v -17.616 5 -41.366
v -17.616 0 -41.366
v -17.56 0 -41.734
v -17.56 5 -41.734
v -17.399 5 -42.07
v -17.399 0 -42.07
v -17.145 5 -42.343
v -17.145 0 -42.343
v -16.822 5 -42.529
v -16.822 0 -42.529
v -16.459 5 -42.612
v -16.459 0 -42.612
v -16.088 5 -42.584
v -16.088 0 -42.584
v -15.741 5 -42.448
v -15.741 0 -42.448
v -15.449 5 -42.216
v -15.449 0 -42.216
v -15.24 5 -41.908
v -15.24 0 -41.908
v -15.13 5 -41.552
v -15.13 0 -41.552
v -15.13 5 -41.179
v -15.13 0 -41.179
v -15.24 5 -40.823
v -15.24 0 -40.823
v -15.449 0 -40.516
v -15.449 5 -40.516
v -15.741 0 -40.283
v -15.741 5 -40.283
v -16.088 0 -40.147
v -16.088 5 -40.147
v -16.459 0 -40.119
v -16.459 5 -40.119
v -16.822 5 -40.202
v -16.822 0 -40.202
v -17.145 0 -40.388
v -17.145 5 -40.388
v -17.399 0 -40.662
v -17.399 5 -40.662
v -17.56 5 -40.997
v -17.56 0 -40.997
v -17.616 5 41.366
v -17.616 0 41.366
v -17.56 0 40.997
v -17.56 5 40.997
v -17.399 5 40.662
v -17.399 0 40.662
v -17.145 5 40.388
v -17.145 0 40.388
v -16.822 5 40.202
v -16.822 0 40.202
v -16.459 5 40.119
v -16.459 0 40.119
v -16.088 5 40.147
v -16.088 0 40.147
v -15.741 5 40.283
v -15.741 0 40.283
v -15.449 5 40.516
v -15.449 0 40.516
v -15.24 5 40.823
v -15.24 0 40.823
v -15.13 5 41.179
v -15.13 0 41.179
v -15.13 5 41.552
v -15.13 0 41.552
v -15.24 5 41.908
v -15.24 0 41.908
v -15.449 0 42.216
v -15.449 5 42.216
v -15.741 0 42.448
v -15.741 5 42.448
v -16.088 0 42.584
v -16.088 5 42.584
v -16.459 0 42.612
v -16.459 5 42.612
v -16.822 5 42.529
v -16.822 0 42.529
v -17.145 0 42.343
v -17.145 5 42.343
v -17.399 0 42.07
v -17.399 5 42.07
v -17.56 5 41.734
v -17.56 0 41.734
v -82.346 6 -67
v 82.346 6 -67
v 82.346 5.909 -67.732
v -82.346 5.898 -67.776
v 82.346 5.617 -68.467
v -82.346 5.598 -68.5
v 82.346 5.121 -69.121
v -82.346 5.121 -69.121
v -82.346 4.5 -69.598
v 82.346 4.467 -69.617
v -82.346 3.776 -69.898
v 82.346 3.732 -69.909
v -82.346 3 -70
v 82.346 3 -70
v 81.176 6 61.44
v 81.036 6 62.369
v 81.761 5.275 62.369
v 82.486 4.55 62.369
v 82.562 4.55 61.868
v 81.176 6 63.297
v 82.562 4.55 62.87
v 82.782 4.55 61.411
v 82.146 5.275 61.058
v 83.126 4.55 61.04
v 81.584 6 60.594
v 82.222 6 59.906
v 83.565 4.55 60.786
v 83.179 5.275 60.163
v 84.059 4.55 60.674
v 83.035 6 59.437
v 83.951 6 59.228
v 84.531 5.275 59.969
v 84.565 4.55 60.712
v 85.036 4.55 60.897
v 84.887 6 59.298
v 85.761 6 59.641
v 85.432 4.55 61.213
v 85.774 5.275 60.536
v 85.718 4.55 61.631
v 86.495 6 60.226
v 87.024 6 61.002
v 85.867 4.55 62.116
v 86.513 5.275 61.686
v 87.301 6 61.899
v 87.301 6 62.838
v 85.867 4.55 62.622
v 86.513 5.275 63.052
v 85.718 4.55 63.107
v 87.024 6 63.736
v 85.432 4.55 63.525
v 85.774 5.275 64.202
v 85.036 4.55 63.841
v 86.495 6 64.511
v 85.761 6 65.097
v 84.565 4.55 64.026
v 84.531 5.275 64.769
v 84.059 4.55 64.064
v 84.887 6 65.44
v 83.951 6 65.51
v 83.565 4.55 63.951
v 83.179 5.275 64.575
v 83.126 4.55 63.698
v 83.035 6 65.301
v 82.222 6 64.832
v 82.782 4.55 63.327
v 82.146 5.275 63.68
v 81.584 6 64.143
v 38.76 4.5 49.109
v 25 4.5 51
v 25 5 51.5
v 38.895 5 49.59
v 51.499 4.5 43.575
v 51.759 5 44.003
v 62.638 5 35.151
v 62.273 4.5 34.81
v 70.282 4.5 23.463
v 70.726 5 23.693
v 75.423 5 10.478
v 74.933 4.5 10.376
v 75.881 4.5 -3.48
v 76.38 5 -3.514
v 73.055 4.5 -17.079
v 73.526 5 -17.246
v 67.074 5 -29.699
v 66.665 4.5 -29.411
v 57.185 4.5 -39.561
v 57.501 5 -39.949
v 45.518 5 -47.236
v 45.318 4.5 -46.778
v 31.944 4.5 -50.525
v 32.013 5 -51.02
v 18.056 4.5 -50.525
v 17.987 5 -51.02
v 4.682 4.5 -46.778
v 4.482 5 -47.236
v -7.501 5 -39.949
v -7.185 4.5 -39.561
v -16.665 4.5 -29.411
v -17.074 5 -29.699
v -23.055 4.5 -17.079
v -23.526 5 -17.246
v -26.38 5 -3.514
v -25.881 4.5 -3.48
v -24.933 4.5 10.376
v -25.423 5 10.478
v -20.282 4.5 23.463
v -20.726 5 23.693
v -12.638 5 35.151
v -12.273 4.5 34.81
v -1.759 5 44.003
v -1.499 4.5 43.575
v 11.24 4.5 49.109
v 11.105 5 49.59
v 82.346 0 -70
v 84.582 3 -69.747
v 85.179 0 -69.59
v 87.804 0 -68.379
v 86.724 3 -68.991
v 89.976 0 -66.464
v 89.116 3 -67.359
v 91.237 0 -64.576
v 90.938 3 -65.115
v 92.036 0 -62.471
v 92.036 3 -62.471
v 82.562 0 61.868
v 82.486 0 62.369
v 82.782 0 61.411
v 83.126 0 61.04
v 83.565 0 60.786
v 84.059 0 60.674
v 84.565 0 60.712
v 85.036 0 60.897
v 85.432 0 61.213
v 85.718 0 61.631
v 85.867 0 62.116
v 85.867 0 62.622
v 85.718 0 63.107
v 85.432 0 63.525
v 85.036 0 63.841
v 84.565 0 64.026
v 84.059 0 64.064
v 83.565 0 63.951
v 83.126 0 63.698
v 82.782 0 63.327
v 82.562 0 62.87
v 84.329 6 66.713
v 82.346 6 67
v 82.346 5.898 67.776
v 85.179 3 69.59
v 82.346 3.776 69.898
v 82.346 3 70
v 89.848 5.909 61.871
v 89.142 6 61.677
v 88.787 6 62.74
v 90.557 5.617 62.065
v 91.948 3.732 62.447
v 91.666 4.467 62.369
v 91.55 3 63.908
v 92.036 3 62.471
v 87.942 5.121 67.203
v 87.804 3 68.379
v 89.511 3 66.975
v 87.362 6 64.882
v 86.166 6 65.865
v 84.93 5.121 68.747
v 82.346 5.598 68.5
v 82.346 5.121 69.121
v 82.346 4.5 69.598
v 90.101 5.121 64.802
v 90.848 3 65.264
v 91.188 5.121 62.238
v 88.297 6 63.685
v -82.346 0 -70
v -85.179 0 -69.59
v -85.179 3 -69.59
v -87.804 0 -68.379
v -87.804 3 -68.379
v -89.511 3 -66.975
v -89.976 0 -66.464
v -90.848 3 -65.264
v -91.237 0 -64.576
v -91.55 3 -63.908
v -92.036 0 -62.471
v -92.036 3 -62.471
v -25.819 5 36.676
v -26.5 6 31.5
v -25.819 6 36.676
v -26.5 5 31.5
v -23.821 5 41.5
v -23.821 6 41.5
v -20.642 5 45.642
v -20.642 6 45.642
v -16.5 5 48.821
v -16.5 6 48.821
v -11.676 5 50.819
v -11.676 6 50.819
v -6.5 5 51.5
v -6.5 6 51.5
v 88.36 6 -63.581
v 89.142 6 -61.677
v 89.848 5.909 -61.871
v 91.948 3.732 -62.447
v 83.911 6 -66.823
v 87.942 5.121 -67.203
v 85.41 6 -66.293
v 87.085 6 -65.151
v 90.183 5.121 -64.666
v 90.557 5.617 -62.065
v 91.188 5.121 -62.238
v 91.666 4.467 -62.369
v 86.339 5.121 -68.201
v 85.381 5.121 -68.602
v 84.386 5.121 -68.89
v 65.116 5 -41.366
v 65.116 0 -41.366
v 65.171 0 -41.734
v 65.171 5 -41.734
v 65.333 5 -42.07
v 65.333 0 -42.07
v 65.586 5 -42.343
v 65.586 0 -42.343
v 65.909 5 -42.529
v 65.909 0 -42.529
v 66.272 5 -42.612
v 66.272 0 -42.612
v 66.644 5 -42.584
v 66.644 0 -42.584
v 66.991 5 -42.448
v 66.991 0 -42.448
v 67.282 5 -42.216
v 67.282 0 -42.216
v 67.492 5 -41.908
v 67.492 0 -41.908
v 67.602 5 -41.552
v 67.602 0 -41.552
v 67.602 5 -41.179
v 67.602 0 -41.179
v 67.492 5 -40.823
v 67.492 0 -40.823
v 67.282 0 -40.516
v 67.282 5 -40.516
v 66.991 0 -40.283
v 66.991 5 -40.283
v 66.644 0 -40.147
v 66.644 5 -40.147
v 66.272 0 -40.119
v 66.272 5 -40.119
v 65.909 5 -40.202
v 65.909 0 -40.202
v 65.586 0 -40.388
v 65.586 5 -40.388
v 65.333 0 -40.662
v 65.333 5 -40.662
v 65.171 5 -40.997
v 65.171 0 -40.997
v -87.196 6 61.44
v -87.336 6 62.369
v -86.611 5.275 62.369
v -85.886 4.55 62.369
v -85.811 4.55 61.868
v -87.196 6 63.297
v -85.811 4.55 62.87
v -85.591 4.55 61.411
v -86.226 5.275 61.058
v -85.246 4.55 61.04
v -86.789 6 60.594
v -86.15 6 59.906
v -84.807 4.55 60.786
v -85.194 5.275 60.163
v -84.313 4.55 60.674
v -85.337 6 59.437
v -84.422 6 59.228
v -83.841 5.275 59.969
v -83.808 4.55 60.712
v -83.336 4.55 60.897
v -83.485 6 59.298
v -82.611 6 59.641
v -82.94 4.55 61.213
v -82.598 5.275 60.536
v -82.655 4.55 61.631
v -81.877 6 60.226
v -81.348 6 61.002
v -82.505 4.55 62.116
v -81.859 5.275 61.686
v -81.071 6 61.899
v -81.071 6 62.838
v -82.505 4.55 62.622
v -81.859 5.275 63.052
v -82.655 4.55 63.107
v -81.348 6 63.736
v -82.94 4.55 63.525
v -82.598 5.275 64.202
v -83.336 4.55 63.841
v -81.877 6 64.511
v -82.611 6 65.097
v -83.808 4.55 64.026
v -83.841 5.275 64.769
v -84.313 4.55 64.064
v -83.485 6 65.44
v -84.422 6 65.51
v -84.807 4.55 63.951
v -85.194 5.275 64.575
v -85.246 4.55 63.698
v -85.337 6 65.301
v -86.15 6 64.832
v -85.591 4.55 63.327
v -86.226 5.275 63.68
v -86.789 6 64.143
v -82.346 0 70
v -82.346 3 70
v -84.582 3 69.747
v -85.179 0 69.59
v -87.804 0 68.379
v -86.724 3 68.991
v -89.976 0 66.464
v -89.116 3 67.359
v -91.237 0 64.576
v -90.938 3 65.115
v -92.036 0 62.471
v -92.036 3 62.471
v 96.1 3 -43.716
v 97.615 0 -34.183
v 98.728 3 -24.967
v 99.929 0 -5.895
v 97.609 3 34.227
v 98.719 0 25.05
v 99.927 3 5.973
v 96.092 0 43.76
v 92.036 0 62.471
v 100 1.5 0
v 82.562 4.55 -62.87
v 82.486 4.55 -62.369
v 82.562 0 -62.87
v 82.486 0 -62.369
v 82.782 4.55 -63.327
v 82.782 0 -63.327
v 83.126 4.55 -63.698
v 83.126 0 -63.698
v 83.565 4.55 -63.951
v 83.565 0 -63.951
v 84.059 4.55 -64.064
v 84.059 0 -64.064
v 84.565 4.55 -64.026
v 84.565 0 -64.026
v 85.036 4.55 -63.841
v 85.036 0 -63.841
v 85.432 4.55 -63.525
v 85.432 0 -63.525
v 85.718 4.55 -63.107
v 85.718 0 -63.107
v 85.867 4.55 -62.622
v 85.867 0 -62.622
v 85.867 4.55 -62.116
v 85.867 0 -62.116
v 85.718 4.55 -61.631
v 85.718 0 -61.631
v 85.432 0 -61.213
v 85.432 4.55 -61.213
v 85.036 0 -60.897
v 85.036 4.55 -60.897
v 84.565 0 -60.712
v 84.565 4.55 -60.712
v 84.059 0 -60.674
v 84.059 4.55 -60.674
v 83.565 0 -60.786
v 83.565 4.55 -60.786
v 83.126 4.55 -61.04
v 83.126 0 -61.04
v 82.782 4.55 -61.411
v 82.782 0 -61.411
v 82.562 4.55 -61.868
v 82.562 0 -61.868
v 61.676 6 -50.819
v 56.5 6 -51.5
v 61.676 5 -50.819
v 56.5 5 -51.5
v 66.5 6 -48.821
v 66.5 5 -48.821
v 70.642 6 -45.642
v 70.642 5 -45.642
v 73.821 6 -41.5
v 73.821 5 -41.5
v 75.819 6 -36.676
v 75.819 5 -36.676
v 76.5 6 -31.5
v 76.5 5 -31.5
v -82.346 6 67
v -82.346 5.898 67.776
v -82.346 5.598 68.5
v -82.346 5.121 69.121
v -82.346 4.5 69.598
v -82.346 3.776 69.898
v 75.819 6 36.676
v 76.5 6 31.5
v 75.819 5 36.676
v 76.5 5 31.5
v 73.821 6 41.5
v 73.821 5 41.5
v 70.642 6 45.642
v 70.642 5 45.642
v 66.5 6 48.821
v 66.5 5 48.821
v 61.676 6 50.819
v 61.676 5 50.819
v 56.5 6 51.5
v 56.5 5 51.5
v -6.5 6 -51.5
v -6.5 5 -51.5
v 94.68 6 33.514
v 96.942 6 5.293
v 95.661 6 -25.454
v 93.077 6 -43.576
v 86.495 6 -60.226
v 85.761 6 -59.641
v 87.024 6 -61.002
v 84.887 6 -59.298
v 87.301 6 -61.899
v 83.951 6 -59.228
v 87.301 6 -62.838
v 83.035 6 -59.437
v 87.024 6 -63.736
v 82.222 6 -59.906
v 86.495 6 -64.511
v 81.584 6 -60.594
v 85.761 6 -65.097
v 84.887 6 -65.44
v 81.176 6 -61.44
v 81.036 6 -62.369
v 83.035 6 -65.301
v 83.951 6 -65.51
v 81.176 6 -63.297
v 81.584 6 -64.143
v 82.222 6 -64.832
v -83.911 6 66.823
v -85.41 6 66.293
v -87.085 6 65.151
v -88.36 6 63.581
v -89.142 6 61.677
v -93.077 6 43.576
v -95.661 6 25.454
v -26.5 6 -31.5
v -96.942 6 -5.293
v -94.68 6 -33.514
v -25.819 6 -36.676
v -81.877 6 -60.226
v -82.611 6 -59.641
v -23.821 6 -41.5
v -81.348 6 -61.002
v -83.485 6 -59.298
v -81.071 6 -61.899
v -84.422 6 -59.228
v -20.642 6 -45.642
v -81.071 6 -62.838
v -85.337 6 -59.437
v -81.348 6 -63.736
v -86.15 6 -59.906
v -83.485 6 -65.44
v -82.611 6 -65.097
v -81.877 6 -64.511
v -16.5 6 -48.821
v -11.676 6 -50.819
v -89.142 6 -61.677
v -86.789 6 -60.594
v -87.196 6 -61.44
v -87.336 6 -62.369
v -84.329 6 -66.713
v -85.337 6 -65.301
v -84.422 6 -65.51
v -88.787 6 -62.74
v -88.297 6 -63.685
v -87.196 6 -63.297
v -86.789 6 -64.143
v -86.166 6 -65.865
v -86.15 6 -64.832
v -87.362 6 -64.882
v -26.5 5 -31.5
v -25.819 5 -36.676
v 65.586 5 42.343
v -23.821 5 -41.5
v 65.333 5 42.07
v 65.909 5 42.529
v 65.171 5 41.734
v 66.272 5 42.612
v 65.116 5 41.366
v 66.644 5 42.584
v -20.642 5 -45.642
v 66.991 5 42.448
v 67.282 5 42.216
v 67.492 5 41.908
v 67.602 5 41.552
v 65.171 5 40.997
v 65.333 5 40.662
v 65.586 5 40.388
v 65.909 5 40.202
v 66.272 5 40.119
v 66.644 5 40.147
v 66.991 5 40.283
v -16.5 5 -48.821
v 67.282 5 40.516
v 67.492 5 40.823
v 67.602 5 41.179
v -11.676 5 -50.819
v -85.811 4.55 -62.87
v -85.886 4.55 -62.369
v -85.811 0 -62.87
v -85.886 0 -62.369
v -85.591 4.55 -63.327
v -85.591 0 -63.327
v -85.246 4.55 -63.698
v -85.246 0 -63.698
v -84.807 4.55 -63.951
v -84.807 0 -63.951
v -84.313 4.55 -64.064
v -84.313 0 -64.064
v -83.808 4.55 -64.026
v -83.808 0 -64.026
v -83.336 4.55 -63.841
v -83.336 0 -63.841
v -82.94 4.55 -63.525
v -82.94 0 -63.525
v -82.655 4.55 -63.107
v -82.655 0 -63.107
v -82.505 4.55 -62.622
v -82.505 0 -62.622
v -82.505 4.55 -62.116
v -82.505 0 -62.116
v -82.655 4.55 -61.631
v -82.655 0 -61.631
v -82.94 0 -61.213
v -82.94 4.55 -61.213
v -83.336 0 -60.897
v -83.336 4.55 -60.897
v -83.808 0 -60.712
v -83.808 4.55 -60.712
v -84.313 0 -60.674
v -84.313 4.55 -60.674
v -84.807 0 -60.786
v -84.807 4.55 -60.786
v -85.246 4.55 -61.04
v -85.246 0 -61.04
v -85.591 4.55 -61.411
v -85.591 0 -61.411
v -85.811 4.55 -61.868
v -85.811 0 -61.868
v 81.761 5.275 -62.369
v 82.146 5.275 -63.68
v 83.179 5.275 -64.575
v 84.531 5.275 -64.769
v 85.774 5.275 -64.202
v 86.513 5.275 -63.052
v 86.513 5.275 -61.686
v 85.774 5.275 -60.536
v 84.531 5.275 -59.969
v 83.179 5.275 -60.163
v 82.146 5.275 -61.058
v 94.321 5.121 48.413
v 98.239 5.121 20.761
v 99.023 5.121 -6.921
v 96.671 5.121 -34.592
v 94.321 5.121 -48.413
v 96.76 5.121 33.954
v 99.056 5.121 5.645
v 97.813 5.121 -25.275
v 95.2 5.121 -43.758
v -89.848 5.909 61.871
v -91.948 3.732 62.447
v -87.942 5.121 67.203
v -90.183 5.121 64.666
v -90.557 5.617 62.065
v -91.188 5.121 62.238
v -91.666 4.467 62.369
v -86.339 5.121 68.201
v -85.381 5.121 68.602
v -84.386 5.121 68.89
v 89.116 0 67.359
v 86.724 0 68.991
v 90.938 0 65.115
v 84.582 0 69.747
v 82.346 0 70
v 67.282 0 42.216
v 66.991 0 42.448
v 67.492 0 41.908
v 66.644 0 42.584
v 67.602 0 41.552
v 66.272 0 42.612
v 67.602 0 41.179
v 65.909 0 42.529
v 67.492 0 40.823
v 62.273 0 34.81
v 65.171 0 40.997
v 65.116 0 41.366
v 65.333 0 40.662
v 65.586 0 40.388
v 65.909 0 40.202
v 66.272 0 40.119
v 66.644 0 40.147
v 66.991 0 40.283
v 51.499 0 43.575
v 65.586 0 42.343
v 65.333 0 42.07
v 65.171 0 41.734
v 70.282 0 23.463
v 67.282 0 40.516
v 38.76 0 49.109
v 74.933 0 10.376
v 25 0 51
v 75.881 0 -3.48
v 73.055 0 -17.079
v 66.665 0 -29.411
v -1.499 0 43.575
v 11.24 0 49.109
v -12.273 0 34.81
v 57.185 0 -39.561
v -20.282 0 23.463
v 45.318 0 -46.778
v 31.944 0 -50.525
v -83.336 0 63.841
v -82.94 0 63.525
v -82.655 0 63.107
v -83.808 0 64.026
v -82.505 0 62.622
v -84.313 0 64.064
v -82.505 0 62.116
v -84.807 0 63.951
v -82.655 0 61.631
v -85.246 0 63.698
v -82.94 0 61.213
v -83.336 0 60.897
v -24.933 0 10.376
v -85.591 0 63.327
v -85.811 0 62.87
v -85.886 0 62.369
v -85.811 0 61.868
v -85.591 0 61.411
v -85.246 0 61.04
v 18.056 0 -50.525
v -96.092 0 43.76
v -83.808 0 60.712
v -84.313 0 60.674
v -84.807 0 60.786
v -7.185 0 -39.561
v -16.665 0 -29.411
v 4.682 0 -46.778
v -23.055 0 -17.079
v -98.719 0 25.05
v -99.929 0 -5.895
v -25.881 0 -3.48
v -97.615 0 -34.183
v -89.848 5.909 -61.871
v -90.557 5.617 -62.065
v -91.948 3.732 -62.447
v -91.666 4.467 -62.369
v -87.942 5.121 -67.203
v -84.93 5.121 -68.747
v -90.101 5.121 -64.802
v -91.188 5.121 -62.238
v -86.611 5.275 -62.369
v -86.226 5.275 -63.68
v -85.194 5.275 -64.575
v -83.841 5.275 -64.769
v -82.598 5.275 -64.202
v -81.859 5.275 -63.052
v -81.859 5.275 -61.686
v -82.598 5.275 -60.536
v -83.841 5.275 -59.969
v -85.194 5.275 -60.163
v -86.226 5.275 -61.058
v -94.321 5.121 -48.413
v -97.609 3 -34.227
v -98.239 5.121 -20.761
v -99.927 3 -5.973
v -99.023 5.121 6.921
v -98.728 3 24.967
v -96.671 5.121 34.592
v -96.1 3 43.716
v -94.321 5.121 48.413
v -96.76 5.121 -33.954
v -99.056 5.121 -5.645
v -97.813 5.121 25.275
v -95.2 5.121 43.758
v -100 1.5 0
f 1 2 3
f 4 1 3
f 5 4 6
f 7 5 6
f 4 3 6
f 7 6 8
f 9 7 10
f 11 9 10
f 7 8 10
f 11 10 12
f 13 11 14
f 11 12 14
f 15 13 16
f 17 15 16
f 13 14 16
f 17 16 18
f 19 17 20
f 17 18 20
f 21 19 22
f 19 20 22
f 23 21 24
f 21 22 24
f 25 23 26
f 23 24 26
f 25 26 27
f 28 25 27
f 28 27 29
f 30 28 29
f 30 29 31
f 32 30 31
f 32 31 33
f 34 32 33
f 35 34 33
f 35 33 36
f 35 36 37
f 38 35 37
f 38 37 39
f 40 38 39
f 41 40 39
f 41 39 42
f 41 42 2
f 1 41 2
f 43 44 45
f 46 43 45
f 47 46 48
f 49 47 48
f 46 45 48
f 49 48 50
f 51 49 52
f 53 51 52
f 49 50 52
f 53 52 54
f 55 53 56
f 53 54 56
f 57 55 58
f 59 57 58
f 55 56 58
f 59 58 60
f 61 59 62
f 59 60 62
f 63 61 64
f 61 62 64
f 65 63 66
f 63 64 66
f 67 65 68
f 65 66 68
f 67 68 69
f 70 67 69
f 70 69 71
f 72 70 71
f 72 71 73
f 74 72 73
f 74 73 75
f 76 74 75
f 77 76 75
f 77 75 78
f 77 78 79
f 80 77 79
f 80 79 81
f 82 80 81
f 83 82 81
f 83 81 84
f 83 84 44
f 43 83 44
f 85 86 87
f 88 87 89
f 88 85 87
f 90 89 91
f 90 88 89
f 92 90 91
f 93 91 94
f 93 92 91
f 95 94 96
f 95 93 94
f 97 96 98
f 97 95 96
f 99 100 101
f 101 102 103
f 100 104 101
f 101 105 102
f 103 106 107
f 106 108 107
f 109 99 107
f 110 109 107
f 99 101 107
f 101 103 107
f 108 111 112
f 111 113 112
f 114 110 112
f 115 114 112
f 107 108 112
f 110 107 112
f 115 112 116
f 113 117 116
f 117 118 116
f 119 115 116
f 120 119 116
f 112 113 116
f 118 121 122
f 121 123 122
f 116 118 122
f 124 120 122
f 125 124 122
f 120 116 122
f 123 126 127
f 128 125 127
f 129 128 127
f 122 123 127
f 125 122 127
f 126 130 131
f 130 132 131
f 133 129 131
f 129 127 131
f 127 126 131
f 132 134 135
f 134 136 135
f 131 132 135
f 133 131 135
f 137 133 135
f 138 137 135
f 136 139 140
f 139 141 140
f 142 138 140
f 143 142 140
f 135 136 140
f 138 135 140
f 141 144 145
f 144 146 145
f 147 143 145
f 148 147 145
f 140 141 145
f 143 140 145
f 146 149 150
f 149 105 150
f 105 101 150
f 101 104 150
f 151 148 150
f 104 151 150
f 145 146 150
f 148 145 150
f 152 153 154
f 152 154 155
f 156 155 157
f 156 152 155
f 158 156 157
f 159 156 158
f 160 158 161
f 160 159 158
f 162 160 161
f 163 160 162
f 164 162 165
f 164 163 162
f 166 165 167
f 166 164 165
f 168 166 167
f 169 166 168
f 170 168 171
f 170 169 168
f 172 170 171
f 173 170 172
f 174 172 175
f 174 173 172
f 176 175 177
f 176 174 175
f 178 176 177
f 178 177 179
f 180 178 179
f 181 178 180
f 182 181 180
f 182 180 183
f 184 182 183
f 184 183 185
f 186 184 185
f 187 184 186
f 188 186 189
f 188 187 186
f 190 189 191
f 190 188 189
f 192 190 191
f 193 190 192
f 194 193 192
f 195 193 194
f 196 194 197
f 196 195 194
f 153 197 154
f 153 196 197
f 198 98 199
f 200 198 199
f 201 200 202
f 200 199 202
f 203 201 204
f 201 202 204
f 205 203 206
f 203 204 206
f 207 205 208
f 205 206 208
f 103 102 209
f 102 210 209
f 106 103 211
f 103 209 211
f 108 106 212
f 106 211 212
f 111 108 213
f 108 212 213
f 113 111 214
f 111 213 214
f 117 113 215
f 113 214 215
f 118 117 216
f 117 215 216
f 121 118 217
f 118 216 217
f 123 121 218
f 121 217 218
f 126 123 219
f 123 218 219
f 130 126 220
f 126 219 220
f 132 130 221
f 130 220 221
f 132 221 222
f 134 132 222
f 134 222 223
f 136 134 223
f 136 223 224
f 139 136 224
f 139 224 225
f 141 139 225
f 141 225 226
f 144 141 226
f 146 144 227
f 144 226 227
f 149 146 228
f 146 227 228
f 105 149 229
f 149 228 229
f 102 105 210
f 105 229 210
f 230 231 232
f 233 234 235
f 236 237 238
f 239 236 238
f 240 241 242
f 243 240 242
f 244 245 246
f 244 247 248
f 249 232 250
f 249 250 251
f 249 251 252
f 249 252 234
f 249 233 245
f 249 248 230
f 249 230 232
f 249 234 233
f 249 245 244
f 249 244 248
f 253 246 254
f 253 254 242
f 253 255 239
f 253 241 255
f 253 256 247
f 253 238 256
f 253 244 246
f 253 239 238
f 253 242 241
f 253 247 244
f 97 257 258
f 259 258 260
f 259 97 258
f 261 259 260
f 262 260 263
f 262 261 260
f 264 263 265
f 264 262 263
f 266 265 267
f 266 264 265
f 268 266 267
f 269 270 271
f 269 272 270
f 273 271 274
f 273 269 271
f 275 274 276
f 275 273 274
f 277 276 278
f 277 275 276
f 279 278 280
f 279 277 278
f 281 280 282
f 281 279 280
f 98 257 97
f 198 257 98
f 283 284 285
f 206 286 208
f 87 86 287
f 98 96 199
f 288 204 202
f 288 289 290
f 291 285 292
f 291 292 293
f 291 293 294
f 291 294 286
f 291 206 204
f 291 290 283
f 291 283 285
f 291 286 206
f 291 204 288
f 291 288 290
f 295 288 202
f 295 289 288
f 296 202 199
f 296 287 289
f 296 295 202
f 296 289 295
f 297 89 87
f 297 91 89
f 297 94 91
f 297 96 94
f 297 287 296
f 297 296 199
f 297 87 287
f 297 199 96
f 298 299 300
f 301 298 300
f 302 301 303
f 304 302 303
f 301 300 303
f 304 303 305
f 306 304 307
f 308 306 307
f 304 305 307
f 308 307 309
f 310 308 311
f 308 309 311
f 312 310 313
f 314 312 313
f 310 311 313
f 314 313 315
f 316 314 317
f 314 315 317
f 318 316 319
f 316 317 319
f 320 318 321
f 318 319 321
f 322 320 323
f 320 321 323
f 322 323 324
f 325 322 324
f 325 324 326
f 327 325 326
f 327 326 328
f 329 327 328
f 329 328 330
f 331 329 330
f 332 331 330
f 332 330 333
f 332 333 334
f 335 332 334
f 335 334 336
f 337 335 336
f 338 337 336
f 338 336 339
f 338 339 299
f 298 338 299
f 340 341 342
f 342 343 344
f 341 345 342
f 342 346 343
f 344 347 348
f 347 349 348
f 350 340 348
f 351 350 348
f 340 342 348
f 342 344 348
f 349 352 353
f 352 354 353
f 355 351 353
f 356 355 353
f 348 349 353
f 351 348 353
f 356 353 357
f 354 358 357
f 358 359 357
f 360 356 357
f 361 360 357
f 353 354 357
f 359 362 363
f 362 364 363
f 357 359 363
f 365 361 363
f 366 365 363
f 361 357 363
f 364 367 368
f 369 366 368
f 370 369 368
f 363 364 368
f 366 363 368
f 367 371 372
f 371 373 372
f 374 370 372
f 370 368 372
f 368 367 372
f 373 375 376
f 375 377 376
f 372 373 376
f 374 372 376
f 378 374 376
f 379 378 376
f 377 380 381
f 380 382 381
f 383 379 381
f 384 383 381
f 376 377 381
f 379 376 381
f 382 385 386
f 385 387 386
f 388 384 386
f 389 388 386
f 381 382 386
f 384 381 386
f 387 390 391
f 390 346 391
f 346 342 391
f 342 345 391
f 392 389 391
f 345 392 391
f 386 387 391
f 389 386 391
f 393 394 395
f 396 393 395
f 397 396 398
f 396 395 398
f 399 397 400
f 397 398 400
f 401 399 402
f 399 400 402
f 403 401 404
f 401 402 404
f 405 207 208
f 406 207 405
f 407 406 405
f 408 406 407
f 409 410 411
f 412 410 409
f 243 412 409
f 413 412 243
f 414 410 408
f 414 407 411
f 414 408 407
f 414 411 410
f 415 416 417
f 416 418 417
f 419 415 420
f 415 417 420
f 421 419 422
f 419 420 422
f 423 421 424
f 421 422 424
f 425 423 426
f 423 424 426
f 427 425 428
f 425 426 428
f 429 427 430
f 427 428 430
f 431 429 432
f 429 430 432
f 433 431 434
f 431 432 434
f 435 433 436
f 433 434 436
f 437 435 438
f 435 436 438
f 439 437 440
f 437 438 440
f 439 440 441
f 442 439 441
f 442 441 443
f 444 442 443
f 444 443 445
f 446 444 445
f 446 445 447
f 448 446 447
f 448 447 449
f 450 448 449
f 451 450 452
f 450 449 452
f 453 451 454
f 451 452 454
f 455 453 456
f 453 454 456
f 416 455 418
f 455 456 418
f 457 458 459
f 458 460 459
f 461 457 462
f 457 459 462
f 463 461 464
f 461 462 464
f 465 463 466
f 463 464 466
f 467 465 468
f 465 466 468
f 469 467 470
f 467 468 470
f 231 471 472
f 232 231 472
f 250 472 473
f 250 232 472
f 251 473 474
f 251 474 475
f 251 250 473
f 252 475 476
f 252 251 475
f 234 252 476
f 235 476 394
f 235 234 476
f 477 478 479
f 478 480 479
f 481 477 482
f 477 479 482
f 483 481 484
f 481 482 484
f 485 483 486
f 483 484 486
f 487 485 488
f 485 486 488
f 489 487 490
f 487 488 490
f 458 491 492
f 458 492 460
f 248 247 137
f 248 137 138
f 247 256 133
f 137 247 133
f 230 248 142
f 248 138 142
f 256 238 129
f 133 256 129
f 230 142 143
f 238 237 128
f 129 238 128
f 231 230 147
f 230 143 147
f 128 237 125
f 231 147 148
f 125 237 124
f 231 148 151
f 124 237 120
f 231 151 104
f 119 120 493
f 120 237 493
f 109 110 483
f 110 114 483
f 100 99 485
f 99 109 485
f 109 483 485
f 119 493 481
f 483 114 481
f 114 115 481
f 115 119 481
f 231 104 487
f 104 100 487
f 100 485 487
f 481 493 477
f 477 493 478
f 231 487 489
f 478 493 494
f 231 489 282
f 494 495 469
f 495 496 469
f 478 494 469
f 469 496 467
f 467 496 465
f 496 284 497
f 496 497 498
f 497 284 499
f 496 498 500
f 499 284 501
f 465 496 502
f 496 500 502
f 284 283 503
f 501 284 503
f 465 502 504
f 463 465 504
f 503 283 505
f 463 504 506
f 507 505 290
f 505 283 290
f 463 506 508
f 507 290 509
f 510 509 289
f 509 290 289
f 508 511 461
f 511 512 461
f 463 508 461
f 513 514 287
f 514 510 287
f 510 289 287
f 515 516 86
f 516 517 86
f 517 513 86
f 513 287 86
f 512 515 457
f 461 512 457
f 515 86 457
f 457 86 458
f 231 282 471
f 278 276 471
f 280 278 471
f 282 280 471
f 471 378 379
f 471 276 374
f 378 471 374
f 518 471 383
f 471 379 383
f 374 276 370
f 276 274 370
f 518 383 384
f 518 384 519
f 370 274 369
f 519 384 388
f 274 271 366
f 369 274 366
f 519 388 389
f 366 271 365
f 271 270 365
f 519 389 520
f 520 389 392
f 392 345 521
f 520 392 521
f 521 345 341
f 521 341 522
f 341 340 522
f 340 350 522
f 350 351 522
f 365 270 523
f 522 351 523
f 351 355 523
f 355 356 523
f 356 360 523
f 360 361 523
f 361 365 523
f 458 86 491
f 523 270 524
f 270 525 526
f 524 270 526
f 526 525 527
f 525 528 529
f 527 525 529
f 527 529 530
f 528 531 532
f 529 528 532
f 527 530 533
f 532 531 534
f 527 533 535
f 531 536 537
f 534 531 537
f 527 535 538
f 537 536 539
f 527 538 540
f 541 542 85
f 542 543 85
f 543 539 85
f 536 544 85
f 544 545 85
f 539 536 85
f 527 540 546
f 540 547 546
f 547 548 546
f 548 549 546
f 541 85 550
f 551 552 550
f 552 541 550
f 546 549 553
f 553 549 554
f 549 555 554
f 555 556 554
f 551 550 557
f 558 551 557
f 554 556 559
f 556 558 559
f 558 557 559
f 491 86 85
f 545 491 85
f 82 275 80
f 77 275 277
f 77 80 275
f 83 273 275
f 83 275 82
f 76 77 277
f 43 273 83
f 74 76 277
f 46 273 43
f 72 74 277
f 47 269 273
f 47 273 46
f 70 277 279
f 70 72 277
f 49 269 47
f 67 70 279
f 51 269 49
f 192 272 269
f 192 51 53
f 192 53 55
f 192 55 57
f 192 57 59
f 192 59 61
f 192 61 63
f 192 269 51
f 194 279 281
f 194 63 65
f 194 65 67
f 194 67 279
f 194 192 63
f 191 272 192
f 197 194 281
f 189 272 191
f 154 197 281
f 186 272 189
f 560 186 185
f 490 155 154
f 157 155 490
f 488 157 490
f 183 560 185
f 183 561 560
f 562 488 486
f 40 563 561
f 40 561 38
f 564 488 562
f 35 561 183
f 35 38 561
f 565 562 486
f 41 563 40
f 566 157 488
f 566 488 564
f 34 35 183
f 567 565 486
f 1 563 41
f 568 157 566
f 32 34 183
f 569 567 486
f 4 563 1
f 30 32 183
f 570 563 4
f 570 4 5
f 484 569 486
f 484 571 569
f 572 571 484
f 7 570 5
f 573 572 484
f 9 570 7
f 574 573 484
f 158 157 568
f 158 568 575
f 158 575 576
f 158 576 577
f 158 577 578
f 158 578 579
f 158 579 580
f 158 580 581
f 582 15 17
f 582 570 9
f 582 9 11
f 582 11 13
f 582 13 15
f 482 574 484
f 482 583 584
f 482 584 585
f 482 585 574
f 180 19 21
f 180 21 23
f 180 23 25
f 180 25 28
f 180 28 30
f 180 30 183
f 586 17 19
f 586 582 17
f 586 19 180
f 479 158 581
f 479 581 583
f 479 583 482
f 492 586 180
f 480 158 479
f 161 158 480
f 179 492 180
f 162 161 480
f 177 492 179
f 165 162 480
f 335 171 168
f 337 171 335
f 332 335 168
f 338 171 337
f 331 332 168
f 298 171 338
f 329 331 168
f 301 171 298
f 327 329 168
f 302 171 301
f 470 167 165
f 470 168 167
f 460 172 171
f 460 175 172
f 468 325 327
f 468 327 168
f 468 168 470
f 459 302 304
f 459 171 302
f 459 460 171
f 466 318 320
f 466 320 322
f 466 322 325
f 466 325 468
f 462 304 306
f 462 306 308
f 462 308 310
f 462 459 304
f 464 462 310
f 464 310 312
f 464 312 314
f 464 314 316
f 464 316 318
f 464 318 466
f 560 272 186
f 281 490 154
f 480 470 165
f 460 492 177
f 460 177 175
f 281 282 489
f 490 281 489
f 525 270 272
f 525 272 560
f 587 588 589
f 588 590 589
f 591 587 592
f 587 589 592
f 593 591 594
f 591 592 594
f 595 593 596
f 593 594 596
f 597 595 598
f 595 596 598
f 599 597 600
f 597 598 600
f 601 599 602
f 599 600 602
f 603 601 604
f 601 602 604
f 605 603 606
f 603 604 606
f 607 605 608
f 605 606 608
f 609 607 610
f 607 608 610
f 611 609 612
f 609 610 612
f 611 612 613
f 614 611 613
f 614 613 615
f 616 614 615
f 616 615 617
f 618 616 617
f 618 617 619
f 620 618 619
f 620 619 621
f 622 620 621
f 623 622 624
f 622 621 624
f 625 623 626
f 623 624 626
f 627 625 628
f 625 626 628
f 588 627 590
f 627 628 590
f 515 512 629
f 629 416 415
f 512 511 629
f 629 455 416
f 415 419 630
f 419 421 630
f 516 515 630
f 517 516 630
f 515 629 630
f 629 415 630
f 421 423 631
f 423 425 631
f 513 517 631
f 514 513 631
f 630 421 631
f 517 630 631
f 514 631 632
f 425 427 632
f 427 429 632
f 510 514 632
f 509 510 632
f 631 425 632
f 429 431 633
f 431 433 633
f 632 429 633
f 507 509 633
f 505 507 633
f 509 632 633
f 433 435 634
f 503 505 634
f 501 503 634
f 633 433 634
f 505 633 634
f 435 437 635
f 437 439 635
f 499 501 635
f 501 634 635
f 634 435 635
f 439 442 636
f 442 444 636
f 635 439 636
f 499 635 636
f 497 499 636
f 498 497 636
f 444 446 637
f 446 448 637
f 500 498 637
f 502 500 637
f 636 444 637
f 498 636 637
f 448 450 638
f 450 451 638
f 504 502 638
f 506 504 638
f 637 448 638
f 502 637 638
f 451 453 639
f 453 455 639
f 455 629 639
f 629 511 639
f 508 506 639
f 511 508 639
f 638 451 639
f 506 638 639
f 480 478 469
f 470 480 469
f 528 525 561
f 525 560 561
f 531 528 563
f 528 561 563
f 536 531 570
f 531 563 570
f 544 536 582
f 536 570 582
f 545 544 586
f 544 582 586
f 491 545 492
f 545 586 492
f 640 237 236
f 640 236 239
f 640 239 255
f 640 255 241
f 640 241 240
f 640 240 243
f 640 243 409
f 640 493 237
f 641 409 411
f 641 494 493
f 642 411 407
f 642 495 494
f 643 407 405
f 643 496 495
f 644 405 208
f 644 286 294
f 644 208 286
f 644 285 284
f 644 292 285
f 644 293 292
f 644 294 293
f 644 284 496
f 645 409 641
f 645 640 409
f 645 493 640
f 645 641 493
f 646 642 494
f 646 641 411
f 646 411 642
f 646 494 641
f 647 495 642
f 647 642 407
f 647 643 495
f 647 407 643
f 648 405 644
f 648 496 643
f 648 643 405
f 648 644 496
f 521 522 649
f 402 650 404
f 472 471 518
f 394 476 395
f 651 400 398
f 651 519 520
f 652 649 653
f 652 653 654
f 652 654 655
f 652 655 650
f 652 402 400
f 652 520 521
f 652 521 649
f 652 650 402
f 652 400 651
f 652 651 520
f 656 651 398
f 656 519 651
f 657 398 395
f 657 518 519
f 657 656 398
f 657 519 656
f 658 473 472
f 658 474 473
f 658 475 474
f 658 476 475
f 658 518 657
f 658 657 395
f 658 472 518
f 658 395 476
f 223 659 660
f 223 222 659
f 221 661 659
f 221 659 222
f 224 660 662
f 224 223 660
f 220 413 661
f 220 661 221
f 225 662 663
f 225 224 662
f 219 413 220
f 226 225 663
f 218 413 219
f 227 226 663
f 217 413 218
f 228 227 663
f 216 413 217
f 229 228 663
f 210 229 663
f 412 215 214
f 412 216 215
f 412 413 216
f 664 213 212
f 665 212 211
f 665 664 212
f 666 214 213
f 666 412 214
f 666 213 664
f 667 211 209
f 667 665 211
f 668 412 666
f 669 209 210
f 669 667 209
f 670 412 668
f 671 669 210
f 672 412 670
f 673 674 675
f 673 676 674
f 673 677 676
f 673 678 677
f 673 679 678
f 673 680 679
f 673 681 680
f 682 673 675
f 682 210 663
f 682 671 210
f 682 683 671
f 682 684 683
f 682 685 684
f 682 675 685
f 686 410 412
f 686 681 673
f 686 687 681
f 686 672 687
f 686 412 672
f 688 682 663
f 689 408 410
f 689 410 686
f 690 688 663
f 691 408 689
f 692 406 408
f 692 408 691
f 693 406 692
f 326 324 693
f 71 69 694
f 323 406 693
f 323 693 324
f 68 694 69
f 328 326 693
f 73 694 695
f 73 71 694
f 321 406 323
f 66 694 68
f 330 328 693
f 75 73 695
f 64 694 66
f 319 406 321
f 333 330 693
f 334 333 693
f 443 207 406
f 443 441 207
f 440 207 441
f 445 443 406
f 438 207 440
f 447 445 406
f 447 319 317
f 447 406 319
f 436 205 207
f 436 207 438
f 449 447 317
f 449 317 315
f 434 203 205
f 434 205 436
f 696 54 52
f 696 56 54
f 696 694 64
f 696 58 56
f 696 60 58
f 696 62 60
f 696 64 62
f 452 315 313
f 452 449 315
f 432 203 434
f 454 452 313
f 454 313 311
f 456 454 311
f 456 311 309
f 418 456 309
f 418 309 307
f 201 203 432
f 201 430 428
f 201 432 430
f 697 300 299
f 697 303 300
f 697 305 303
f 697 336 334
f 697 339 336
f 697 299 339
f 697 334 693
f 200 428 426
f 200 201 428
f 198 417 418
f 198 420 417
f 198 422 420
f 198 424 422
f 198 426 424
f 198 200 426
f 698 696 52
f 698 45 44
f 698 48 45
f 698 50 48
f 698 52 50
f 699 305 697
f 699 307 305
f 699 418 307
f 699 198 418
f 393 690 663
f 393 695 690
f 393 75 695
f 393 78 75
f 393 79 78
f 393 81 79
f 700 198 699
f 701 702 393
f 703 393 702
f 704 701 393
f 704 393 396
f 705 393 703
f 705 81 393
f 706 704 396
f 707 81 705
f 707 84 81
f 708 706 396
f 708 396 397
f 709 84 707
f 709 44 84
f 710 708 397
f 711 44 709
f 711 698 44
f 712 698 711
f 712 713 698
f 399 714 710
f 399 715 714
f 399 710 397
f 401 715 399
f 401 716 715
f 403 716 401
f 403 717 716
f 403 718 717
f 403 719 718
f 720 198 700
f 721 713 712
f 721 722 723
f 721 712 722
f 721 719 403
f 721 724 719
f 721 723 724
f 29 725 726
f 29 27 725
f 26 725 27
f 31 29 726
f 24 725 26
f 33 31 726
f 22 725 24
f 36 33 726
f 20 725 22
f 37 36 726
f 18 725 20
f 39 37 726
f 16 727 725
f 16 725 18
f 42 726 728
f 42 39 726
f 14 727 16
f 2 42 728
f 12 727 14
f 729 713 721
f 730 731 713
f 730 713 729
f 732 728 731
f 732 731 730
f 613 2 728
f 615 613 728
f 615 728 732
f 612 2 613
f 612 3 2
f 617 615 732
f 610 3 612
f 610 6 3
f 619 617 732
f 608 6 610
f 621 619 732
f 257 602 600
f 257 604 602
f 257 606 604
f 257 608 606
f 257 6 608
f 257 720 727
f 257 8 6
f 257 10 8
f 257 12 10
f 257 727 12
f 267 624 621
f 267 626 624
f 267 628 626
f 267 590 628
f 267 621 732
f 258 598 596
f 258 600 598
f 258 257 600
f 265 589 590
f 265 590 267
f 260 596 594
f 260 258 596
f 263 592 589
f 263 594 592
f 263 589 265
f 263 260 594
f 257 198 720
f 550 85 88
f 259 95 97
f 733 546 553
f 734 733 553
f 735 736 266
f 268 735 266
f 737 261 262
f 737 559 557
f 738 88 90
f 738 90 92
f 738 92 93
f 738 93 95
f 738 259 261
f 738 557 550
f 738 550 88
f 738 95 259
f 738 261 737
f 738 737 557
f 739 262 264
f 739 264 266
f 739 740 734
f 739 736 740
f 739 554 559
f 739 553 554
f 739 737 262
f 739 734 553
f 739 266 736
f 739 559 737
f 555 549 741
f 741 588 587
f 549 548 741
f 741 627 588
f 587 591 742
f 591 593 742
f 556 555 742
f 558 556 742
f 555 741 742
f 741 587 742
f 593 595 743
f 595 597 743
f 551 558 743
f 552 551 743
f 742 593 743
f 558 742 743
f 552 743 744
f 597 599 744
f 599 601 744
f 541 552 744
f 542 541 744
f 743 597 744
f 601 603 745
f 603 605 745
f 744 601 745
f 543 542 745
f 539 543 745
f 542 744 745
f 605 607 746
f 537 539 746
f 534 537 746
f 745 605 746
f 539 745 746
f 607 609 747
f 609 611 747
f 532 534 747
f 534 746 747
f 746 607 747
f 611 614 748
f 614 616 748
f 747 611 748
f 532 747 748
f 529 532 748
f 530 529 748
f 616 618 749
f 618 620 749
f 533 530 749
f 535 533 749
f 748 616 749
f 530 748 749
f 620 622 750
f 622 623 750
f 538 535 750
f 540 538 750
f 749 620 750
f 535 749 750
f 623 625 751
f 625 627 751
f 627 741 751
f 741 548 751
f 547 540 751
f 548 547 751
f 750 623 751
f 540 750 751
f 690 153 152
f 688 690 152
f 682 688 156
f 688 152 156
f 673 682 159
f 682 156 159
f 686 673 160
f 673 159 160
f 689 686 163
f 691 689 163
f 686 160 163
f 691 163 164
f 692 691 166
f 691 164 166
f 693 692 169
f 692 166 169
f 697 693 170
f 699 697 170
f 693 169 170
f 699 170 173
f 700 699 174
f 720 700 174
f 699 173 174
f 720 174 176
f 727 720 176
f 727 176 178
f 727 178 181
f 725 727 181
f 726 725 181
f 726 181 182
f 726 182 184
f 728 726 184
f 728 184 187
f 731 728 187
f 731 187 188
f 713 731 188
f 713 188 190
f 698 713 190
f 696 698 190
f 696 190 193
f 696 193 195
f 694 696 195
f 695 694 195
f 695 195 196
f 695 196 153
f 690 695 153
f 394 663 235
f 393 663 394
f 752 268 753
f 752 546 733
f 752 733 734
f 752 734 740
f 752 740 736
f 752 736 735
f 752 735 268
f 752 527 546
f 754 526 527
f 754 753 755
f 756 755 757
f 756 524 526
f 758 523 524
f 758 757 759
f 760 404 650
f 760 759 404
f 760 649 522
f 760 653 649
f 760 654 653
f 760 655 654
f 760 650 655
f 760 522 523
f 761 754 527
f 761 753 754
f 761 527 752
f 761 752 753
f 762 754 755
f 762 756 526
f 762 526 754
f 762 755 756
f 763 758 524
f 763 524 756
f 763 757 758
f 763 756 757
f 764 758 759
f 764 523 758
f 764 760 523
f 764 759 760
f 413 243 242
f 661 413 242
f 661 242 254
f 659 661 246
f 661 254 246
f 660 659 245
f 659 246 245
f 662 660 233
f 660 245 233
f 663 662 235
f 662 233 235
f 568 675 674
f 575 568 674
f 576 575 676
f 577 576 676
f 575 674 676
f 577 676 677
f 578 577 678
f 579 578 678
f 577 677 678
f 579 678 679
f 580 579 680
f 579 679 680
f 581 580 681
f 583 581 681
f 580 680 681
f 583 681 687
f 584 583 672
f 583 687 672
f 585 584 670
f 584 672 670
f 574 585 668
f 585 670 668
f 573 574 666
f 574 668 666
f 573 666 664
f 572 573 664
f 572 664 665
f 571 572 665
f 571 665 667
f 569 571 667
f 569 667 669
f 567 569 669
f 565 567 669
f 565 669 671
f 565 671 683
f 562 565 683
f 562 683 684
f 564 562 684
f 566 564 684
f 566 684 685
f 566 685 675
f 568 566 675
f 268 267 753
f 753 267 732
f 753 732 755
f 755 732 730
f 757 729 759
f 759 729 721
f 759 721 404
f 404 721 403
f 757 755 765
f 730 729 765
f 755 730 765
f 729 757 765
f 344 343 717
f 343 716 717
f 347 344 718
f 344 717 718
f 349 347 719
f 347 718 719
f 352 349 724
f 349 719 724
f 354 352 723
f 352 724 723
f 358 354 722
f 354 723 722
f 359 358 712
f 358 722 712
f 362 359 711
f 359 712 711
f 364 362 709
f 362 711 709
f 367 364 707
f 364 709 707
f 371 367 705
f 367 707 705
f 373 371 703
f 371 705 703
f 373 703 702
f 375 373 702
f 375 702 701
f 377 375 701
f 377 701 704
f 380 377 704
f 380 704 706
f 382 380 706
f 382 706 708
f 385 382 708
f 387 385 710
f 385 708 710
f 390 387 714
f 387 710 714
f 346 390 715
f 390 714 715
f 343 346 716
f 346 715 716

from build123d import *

# Parameters (mm, degrees)
BOSS_EXTRUDE1_DEPTH                             = 6
FILLET1_R                                       = 10
FILLET2_R                                       = 3
CUT_EXTRUDE1_REACH                              = 124.213
SKETCH2_R                                       = 51
M3X0_5_TAPPED_HOLE1_D                           = 2.5
CSK_FOR_M3_FLAT_HEAD_MACHINE_SCREW6_D           = 3.4
CSK_FOR_M3_FLAT_HEAD_MACHINE_SCREW6_CSINK_D     = 6.3
CSK_FOR_M3_FLAT_HEAD_MACHINE_SCREW6_CSINK_ANGLE = 90
SKETCH2_7_W                                     = 103
SKETCH2_7_H                                     = 103
CUT_EXTRUDE3_DEPTH                              = 1
FILLET4_R                                       = 20
CHAMFER1_SIZE                                   = 0.5


with BuildPart() as part:
    # Sketch1 → Boss-Extrude1 (new body)
    with BuildSketch(Plane(origin=(0, 0, 0), x_dir=(1, 0, 0), z_dir=(0, 1, 0))):
        with BuildLine():
            Line((-90, 70), (90, 70))
            add(Edge.make_bspline(
                [(90, 70), (110, 0), (90, -70)],
                knots=[0, 0, 0, 1, 1, 1], degree=2))
            Line((90, -70), (-90, -70))
            add(Edge.make_bspline(
                [(-90, 70), (-110, 0), (-90, -70)],
                knots=[0, 0, 0, 1, 1, 1], degree=2))
        make_face()
    extrude(amount=BOSS_EXTRUDE1_DEPTH)

    # Fillet1
    fillet1_edges = [part.edges().sort_by_distance(p)[0] for p in [
        (-90, 3, -70),
        (90, 3, -70),
        (90, 3, 70),
        (-90, 3, 70),
    ]]
    fillet(fillet1_edges, radius=FILLET1_R)

    # Fillet2
    fillet2_edges = [part.edges().sort_by_distance(p)[0] for p in [
        (-100, 6, -3e-09),
        (0, 6, -70),
        (100, 6, -3e-09),
        (0, 6, 70),
        (-88.48120263, 6, 67.896446056),
        (88.48120263, 6, 67.896446056),
        (88.48120263, 6, -67.896446056),
        (-88.48120263, 6, -67.896446056),
    ]]
    fillet(fillet2_edges, radius=FILLET2_R)

    # Sketch2 → Cut-Extrude1 (cut, up to next)
    with BuildSketch(Plane(origin=(0, 6, 0), x_dir=(1, 0, 0), z_dir=(0, 1, 0)), mode=Mode.PRIVATE) as cut_extrude1_sk1:
        with Locations(Location((25, 0, 0), (0, 0, 270))):
            Circle(SKETCH2_R)
    cut_extrude1_tool1 = extrude(cut_extrude1_sk1.sketch, amount=-CUT_EXTRUDE1_REACH, mode=Mode.PRIVATE) & part.part
    add(cut_extrude1_tool1.solids().sort_by_distance((25, 6, 0))[0], mode=Mode.SUBTRACT)

    # M3x0.5 Tapped Hole1 (through all)
    with Locations(Plane(origin=(0, 6, 0), x_dir=(1, 0, 0), z_dir=(0, 1, 0))):
        with Locations((66.365746699, 41.365746699), (66.365746699, -41.365746699), (-16.365746699, -41.365746699), (-16.365746699, 41.365746699)):
            Hole(M3X0_5_TAPPED_HOLE1_D / 2)

    # CSK for M3 Flat Head Machine Screw6 (through all)
    with Locations(Plane(origin=(0, 6, 0), x_dir=(1, 0, 0), z_dir=(0, 1, 0))):
        with Locations((-84.186251123, 62.368933817), (84.186251123, 62.368933817), (84.186251123, -62.368933817), (-84.186251123, -62.368933817)):
            CounterSinkHole(CSK_FOR_M3_FLAT_HEAD_MACHINE_SCREW6_D / 2, CSK_FOR_M3_FLAT_HEAD_MACHINE_SCREW6_CSINK_D / 2, counter_sink_angle=CSK_FOR_M3_FLAT_HEAD_MACHINE_SCREW6_CSINK_ANGLE)

    # Sketch2<7> → Cut-Extrude3 (cut)
    with BuildSketch(Plane(origin=(0, 6, 0), x_dir=(1, 0, 0), z_dir=(0, 1, 0))):
        with Locations((25, 0)):
            Rectangle(SKETCH2_7_W, SKETCH2_7_H)
    extrude(amount=-CUT_EXTRUDE3_DEPTH, mode=Mode.SUBTRACT)

    # Fillet4
    fillet4_edges = [part.edges().sort_by_distance(p)[0] for p in [
        (76.5, 5.5, 51.5),
        (-26.5, 5.5, 51.5),
        (-26.5, 5.5, -51.5),
        (76.5, 5.5, -51.5),
    ]]
    fillet(fillet4_edges, radius=FILLET4_R)

    # Chamfer1
    chamfer1_edges = [part.edges().sort_by_distance(p)[0] for p in [
        (25, 5, -51),
    ]]
    chamfer(chamfer1_edges, length=CHAMFER1_SIZE - 0.0001)  # a hair under: the kernel refuses the full size


solid = part.part
